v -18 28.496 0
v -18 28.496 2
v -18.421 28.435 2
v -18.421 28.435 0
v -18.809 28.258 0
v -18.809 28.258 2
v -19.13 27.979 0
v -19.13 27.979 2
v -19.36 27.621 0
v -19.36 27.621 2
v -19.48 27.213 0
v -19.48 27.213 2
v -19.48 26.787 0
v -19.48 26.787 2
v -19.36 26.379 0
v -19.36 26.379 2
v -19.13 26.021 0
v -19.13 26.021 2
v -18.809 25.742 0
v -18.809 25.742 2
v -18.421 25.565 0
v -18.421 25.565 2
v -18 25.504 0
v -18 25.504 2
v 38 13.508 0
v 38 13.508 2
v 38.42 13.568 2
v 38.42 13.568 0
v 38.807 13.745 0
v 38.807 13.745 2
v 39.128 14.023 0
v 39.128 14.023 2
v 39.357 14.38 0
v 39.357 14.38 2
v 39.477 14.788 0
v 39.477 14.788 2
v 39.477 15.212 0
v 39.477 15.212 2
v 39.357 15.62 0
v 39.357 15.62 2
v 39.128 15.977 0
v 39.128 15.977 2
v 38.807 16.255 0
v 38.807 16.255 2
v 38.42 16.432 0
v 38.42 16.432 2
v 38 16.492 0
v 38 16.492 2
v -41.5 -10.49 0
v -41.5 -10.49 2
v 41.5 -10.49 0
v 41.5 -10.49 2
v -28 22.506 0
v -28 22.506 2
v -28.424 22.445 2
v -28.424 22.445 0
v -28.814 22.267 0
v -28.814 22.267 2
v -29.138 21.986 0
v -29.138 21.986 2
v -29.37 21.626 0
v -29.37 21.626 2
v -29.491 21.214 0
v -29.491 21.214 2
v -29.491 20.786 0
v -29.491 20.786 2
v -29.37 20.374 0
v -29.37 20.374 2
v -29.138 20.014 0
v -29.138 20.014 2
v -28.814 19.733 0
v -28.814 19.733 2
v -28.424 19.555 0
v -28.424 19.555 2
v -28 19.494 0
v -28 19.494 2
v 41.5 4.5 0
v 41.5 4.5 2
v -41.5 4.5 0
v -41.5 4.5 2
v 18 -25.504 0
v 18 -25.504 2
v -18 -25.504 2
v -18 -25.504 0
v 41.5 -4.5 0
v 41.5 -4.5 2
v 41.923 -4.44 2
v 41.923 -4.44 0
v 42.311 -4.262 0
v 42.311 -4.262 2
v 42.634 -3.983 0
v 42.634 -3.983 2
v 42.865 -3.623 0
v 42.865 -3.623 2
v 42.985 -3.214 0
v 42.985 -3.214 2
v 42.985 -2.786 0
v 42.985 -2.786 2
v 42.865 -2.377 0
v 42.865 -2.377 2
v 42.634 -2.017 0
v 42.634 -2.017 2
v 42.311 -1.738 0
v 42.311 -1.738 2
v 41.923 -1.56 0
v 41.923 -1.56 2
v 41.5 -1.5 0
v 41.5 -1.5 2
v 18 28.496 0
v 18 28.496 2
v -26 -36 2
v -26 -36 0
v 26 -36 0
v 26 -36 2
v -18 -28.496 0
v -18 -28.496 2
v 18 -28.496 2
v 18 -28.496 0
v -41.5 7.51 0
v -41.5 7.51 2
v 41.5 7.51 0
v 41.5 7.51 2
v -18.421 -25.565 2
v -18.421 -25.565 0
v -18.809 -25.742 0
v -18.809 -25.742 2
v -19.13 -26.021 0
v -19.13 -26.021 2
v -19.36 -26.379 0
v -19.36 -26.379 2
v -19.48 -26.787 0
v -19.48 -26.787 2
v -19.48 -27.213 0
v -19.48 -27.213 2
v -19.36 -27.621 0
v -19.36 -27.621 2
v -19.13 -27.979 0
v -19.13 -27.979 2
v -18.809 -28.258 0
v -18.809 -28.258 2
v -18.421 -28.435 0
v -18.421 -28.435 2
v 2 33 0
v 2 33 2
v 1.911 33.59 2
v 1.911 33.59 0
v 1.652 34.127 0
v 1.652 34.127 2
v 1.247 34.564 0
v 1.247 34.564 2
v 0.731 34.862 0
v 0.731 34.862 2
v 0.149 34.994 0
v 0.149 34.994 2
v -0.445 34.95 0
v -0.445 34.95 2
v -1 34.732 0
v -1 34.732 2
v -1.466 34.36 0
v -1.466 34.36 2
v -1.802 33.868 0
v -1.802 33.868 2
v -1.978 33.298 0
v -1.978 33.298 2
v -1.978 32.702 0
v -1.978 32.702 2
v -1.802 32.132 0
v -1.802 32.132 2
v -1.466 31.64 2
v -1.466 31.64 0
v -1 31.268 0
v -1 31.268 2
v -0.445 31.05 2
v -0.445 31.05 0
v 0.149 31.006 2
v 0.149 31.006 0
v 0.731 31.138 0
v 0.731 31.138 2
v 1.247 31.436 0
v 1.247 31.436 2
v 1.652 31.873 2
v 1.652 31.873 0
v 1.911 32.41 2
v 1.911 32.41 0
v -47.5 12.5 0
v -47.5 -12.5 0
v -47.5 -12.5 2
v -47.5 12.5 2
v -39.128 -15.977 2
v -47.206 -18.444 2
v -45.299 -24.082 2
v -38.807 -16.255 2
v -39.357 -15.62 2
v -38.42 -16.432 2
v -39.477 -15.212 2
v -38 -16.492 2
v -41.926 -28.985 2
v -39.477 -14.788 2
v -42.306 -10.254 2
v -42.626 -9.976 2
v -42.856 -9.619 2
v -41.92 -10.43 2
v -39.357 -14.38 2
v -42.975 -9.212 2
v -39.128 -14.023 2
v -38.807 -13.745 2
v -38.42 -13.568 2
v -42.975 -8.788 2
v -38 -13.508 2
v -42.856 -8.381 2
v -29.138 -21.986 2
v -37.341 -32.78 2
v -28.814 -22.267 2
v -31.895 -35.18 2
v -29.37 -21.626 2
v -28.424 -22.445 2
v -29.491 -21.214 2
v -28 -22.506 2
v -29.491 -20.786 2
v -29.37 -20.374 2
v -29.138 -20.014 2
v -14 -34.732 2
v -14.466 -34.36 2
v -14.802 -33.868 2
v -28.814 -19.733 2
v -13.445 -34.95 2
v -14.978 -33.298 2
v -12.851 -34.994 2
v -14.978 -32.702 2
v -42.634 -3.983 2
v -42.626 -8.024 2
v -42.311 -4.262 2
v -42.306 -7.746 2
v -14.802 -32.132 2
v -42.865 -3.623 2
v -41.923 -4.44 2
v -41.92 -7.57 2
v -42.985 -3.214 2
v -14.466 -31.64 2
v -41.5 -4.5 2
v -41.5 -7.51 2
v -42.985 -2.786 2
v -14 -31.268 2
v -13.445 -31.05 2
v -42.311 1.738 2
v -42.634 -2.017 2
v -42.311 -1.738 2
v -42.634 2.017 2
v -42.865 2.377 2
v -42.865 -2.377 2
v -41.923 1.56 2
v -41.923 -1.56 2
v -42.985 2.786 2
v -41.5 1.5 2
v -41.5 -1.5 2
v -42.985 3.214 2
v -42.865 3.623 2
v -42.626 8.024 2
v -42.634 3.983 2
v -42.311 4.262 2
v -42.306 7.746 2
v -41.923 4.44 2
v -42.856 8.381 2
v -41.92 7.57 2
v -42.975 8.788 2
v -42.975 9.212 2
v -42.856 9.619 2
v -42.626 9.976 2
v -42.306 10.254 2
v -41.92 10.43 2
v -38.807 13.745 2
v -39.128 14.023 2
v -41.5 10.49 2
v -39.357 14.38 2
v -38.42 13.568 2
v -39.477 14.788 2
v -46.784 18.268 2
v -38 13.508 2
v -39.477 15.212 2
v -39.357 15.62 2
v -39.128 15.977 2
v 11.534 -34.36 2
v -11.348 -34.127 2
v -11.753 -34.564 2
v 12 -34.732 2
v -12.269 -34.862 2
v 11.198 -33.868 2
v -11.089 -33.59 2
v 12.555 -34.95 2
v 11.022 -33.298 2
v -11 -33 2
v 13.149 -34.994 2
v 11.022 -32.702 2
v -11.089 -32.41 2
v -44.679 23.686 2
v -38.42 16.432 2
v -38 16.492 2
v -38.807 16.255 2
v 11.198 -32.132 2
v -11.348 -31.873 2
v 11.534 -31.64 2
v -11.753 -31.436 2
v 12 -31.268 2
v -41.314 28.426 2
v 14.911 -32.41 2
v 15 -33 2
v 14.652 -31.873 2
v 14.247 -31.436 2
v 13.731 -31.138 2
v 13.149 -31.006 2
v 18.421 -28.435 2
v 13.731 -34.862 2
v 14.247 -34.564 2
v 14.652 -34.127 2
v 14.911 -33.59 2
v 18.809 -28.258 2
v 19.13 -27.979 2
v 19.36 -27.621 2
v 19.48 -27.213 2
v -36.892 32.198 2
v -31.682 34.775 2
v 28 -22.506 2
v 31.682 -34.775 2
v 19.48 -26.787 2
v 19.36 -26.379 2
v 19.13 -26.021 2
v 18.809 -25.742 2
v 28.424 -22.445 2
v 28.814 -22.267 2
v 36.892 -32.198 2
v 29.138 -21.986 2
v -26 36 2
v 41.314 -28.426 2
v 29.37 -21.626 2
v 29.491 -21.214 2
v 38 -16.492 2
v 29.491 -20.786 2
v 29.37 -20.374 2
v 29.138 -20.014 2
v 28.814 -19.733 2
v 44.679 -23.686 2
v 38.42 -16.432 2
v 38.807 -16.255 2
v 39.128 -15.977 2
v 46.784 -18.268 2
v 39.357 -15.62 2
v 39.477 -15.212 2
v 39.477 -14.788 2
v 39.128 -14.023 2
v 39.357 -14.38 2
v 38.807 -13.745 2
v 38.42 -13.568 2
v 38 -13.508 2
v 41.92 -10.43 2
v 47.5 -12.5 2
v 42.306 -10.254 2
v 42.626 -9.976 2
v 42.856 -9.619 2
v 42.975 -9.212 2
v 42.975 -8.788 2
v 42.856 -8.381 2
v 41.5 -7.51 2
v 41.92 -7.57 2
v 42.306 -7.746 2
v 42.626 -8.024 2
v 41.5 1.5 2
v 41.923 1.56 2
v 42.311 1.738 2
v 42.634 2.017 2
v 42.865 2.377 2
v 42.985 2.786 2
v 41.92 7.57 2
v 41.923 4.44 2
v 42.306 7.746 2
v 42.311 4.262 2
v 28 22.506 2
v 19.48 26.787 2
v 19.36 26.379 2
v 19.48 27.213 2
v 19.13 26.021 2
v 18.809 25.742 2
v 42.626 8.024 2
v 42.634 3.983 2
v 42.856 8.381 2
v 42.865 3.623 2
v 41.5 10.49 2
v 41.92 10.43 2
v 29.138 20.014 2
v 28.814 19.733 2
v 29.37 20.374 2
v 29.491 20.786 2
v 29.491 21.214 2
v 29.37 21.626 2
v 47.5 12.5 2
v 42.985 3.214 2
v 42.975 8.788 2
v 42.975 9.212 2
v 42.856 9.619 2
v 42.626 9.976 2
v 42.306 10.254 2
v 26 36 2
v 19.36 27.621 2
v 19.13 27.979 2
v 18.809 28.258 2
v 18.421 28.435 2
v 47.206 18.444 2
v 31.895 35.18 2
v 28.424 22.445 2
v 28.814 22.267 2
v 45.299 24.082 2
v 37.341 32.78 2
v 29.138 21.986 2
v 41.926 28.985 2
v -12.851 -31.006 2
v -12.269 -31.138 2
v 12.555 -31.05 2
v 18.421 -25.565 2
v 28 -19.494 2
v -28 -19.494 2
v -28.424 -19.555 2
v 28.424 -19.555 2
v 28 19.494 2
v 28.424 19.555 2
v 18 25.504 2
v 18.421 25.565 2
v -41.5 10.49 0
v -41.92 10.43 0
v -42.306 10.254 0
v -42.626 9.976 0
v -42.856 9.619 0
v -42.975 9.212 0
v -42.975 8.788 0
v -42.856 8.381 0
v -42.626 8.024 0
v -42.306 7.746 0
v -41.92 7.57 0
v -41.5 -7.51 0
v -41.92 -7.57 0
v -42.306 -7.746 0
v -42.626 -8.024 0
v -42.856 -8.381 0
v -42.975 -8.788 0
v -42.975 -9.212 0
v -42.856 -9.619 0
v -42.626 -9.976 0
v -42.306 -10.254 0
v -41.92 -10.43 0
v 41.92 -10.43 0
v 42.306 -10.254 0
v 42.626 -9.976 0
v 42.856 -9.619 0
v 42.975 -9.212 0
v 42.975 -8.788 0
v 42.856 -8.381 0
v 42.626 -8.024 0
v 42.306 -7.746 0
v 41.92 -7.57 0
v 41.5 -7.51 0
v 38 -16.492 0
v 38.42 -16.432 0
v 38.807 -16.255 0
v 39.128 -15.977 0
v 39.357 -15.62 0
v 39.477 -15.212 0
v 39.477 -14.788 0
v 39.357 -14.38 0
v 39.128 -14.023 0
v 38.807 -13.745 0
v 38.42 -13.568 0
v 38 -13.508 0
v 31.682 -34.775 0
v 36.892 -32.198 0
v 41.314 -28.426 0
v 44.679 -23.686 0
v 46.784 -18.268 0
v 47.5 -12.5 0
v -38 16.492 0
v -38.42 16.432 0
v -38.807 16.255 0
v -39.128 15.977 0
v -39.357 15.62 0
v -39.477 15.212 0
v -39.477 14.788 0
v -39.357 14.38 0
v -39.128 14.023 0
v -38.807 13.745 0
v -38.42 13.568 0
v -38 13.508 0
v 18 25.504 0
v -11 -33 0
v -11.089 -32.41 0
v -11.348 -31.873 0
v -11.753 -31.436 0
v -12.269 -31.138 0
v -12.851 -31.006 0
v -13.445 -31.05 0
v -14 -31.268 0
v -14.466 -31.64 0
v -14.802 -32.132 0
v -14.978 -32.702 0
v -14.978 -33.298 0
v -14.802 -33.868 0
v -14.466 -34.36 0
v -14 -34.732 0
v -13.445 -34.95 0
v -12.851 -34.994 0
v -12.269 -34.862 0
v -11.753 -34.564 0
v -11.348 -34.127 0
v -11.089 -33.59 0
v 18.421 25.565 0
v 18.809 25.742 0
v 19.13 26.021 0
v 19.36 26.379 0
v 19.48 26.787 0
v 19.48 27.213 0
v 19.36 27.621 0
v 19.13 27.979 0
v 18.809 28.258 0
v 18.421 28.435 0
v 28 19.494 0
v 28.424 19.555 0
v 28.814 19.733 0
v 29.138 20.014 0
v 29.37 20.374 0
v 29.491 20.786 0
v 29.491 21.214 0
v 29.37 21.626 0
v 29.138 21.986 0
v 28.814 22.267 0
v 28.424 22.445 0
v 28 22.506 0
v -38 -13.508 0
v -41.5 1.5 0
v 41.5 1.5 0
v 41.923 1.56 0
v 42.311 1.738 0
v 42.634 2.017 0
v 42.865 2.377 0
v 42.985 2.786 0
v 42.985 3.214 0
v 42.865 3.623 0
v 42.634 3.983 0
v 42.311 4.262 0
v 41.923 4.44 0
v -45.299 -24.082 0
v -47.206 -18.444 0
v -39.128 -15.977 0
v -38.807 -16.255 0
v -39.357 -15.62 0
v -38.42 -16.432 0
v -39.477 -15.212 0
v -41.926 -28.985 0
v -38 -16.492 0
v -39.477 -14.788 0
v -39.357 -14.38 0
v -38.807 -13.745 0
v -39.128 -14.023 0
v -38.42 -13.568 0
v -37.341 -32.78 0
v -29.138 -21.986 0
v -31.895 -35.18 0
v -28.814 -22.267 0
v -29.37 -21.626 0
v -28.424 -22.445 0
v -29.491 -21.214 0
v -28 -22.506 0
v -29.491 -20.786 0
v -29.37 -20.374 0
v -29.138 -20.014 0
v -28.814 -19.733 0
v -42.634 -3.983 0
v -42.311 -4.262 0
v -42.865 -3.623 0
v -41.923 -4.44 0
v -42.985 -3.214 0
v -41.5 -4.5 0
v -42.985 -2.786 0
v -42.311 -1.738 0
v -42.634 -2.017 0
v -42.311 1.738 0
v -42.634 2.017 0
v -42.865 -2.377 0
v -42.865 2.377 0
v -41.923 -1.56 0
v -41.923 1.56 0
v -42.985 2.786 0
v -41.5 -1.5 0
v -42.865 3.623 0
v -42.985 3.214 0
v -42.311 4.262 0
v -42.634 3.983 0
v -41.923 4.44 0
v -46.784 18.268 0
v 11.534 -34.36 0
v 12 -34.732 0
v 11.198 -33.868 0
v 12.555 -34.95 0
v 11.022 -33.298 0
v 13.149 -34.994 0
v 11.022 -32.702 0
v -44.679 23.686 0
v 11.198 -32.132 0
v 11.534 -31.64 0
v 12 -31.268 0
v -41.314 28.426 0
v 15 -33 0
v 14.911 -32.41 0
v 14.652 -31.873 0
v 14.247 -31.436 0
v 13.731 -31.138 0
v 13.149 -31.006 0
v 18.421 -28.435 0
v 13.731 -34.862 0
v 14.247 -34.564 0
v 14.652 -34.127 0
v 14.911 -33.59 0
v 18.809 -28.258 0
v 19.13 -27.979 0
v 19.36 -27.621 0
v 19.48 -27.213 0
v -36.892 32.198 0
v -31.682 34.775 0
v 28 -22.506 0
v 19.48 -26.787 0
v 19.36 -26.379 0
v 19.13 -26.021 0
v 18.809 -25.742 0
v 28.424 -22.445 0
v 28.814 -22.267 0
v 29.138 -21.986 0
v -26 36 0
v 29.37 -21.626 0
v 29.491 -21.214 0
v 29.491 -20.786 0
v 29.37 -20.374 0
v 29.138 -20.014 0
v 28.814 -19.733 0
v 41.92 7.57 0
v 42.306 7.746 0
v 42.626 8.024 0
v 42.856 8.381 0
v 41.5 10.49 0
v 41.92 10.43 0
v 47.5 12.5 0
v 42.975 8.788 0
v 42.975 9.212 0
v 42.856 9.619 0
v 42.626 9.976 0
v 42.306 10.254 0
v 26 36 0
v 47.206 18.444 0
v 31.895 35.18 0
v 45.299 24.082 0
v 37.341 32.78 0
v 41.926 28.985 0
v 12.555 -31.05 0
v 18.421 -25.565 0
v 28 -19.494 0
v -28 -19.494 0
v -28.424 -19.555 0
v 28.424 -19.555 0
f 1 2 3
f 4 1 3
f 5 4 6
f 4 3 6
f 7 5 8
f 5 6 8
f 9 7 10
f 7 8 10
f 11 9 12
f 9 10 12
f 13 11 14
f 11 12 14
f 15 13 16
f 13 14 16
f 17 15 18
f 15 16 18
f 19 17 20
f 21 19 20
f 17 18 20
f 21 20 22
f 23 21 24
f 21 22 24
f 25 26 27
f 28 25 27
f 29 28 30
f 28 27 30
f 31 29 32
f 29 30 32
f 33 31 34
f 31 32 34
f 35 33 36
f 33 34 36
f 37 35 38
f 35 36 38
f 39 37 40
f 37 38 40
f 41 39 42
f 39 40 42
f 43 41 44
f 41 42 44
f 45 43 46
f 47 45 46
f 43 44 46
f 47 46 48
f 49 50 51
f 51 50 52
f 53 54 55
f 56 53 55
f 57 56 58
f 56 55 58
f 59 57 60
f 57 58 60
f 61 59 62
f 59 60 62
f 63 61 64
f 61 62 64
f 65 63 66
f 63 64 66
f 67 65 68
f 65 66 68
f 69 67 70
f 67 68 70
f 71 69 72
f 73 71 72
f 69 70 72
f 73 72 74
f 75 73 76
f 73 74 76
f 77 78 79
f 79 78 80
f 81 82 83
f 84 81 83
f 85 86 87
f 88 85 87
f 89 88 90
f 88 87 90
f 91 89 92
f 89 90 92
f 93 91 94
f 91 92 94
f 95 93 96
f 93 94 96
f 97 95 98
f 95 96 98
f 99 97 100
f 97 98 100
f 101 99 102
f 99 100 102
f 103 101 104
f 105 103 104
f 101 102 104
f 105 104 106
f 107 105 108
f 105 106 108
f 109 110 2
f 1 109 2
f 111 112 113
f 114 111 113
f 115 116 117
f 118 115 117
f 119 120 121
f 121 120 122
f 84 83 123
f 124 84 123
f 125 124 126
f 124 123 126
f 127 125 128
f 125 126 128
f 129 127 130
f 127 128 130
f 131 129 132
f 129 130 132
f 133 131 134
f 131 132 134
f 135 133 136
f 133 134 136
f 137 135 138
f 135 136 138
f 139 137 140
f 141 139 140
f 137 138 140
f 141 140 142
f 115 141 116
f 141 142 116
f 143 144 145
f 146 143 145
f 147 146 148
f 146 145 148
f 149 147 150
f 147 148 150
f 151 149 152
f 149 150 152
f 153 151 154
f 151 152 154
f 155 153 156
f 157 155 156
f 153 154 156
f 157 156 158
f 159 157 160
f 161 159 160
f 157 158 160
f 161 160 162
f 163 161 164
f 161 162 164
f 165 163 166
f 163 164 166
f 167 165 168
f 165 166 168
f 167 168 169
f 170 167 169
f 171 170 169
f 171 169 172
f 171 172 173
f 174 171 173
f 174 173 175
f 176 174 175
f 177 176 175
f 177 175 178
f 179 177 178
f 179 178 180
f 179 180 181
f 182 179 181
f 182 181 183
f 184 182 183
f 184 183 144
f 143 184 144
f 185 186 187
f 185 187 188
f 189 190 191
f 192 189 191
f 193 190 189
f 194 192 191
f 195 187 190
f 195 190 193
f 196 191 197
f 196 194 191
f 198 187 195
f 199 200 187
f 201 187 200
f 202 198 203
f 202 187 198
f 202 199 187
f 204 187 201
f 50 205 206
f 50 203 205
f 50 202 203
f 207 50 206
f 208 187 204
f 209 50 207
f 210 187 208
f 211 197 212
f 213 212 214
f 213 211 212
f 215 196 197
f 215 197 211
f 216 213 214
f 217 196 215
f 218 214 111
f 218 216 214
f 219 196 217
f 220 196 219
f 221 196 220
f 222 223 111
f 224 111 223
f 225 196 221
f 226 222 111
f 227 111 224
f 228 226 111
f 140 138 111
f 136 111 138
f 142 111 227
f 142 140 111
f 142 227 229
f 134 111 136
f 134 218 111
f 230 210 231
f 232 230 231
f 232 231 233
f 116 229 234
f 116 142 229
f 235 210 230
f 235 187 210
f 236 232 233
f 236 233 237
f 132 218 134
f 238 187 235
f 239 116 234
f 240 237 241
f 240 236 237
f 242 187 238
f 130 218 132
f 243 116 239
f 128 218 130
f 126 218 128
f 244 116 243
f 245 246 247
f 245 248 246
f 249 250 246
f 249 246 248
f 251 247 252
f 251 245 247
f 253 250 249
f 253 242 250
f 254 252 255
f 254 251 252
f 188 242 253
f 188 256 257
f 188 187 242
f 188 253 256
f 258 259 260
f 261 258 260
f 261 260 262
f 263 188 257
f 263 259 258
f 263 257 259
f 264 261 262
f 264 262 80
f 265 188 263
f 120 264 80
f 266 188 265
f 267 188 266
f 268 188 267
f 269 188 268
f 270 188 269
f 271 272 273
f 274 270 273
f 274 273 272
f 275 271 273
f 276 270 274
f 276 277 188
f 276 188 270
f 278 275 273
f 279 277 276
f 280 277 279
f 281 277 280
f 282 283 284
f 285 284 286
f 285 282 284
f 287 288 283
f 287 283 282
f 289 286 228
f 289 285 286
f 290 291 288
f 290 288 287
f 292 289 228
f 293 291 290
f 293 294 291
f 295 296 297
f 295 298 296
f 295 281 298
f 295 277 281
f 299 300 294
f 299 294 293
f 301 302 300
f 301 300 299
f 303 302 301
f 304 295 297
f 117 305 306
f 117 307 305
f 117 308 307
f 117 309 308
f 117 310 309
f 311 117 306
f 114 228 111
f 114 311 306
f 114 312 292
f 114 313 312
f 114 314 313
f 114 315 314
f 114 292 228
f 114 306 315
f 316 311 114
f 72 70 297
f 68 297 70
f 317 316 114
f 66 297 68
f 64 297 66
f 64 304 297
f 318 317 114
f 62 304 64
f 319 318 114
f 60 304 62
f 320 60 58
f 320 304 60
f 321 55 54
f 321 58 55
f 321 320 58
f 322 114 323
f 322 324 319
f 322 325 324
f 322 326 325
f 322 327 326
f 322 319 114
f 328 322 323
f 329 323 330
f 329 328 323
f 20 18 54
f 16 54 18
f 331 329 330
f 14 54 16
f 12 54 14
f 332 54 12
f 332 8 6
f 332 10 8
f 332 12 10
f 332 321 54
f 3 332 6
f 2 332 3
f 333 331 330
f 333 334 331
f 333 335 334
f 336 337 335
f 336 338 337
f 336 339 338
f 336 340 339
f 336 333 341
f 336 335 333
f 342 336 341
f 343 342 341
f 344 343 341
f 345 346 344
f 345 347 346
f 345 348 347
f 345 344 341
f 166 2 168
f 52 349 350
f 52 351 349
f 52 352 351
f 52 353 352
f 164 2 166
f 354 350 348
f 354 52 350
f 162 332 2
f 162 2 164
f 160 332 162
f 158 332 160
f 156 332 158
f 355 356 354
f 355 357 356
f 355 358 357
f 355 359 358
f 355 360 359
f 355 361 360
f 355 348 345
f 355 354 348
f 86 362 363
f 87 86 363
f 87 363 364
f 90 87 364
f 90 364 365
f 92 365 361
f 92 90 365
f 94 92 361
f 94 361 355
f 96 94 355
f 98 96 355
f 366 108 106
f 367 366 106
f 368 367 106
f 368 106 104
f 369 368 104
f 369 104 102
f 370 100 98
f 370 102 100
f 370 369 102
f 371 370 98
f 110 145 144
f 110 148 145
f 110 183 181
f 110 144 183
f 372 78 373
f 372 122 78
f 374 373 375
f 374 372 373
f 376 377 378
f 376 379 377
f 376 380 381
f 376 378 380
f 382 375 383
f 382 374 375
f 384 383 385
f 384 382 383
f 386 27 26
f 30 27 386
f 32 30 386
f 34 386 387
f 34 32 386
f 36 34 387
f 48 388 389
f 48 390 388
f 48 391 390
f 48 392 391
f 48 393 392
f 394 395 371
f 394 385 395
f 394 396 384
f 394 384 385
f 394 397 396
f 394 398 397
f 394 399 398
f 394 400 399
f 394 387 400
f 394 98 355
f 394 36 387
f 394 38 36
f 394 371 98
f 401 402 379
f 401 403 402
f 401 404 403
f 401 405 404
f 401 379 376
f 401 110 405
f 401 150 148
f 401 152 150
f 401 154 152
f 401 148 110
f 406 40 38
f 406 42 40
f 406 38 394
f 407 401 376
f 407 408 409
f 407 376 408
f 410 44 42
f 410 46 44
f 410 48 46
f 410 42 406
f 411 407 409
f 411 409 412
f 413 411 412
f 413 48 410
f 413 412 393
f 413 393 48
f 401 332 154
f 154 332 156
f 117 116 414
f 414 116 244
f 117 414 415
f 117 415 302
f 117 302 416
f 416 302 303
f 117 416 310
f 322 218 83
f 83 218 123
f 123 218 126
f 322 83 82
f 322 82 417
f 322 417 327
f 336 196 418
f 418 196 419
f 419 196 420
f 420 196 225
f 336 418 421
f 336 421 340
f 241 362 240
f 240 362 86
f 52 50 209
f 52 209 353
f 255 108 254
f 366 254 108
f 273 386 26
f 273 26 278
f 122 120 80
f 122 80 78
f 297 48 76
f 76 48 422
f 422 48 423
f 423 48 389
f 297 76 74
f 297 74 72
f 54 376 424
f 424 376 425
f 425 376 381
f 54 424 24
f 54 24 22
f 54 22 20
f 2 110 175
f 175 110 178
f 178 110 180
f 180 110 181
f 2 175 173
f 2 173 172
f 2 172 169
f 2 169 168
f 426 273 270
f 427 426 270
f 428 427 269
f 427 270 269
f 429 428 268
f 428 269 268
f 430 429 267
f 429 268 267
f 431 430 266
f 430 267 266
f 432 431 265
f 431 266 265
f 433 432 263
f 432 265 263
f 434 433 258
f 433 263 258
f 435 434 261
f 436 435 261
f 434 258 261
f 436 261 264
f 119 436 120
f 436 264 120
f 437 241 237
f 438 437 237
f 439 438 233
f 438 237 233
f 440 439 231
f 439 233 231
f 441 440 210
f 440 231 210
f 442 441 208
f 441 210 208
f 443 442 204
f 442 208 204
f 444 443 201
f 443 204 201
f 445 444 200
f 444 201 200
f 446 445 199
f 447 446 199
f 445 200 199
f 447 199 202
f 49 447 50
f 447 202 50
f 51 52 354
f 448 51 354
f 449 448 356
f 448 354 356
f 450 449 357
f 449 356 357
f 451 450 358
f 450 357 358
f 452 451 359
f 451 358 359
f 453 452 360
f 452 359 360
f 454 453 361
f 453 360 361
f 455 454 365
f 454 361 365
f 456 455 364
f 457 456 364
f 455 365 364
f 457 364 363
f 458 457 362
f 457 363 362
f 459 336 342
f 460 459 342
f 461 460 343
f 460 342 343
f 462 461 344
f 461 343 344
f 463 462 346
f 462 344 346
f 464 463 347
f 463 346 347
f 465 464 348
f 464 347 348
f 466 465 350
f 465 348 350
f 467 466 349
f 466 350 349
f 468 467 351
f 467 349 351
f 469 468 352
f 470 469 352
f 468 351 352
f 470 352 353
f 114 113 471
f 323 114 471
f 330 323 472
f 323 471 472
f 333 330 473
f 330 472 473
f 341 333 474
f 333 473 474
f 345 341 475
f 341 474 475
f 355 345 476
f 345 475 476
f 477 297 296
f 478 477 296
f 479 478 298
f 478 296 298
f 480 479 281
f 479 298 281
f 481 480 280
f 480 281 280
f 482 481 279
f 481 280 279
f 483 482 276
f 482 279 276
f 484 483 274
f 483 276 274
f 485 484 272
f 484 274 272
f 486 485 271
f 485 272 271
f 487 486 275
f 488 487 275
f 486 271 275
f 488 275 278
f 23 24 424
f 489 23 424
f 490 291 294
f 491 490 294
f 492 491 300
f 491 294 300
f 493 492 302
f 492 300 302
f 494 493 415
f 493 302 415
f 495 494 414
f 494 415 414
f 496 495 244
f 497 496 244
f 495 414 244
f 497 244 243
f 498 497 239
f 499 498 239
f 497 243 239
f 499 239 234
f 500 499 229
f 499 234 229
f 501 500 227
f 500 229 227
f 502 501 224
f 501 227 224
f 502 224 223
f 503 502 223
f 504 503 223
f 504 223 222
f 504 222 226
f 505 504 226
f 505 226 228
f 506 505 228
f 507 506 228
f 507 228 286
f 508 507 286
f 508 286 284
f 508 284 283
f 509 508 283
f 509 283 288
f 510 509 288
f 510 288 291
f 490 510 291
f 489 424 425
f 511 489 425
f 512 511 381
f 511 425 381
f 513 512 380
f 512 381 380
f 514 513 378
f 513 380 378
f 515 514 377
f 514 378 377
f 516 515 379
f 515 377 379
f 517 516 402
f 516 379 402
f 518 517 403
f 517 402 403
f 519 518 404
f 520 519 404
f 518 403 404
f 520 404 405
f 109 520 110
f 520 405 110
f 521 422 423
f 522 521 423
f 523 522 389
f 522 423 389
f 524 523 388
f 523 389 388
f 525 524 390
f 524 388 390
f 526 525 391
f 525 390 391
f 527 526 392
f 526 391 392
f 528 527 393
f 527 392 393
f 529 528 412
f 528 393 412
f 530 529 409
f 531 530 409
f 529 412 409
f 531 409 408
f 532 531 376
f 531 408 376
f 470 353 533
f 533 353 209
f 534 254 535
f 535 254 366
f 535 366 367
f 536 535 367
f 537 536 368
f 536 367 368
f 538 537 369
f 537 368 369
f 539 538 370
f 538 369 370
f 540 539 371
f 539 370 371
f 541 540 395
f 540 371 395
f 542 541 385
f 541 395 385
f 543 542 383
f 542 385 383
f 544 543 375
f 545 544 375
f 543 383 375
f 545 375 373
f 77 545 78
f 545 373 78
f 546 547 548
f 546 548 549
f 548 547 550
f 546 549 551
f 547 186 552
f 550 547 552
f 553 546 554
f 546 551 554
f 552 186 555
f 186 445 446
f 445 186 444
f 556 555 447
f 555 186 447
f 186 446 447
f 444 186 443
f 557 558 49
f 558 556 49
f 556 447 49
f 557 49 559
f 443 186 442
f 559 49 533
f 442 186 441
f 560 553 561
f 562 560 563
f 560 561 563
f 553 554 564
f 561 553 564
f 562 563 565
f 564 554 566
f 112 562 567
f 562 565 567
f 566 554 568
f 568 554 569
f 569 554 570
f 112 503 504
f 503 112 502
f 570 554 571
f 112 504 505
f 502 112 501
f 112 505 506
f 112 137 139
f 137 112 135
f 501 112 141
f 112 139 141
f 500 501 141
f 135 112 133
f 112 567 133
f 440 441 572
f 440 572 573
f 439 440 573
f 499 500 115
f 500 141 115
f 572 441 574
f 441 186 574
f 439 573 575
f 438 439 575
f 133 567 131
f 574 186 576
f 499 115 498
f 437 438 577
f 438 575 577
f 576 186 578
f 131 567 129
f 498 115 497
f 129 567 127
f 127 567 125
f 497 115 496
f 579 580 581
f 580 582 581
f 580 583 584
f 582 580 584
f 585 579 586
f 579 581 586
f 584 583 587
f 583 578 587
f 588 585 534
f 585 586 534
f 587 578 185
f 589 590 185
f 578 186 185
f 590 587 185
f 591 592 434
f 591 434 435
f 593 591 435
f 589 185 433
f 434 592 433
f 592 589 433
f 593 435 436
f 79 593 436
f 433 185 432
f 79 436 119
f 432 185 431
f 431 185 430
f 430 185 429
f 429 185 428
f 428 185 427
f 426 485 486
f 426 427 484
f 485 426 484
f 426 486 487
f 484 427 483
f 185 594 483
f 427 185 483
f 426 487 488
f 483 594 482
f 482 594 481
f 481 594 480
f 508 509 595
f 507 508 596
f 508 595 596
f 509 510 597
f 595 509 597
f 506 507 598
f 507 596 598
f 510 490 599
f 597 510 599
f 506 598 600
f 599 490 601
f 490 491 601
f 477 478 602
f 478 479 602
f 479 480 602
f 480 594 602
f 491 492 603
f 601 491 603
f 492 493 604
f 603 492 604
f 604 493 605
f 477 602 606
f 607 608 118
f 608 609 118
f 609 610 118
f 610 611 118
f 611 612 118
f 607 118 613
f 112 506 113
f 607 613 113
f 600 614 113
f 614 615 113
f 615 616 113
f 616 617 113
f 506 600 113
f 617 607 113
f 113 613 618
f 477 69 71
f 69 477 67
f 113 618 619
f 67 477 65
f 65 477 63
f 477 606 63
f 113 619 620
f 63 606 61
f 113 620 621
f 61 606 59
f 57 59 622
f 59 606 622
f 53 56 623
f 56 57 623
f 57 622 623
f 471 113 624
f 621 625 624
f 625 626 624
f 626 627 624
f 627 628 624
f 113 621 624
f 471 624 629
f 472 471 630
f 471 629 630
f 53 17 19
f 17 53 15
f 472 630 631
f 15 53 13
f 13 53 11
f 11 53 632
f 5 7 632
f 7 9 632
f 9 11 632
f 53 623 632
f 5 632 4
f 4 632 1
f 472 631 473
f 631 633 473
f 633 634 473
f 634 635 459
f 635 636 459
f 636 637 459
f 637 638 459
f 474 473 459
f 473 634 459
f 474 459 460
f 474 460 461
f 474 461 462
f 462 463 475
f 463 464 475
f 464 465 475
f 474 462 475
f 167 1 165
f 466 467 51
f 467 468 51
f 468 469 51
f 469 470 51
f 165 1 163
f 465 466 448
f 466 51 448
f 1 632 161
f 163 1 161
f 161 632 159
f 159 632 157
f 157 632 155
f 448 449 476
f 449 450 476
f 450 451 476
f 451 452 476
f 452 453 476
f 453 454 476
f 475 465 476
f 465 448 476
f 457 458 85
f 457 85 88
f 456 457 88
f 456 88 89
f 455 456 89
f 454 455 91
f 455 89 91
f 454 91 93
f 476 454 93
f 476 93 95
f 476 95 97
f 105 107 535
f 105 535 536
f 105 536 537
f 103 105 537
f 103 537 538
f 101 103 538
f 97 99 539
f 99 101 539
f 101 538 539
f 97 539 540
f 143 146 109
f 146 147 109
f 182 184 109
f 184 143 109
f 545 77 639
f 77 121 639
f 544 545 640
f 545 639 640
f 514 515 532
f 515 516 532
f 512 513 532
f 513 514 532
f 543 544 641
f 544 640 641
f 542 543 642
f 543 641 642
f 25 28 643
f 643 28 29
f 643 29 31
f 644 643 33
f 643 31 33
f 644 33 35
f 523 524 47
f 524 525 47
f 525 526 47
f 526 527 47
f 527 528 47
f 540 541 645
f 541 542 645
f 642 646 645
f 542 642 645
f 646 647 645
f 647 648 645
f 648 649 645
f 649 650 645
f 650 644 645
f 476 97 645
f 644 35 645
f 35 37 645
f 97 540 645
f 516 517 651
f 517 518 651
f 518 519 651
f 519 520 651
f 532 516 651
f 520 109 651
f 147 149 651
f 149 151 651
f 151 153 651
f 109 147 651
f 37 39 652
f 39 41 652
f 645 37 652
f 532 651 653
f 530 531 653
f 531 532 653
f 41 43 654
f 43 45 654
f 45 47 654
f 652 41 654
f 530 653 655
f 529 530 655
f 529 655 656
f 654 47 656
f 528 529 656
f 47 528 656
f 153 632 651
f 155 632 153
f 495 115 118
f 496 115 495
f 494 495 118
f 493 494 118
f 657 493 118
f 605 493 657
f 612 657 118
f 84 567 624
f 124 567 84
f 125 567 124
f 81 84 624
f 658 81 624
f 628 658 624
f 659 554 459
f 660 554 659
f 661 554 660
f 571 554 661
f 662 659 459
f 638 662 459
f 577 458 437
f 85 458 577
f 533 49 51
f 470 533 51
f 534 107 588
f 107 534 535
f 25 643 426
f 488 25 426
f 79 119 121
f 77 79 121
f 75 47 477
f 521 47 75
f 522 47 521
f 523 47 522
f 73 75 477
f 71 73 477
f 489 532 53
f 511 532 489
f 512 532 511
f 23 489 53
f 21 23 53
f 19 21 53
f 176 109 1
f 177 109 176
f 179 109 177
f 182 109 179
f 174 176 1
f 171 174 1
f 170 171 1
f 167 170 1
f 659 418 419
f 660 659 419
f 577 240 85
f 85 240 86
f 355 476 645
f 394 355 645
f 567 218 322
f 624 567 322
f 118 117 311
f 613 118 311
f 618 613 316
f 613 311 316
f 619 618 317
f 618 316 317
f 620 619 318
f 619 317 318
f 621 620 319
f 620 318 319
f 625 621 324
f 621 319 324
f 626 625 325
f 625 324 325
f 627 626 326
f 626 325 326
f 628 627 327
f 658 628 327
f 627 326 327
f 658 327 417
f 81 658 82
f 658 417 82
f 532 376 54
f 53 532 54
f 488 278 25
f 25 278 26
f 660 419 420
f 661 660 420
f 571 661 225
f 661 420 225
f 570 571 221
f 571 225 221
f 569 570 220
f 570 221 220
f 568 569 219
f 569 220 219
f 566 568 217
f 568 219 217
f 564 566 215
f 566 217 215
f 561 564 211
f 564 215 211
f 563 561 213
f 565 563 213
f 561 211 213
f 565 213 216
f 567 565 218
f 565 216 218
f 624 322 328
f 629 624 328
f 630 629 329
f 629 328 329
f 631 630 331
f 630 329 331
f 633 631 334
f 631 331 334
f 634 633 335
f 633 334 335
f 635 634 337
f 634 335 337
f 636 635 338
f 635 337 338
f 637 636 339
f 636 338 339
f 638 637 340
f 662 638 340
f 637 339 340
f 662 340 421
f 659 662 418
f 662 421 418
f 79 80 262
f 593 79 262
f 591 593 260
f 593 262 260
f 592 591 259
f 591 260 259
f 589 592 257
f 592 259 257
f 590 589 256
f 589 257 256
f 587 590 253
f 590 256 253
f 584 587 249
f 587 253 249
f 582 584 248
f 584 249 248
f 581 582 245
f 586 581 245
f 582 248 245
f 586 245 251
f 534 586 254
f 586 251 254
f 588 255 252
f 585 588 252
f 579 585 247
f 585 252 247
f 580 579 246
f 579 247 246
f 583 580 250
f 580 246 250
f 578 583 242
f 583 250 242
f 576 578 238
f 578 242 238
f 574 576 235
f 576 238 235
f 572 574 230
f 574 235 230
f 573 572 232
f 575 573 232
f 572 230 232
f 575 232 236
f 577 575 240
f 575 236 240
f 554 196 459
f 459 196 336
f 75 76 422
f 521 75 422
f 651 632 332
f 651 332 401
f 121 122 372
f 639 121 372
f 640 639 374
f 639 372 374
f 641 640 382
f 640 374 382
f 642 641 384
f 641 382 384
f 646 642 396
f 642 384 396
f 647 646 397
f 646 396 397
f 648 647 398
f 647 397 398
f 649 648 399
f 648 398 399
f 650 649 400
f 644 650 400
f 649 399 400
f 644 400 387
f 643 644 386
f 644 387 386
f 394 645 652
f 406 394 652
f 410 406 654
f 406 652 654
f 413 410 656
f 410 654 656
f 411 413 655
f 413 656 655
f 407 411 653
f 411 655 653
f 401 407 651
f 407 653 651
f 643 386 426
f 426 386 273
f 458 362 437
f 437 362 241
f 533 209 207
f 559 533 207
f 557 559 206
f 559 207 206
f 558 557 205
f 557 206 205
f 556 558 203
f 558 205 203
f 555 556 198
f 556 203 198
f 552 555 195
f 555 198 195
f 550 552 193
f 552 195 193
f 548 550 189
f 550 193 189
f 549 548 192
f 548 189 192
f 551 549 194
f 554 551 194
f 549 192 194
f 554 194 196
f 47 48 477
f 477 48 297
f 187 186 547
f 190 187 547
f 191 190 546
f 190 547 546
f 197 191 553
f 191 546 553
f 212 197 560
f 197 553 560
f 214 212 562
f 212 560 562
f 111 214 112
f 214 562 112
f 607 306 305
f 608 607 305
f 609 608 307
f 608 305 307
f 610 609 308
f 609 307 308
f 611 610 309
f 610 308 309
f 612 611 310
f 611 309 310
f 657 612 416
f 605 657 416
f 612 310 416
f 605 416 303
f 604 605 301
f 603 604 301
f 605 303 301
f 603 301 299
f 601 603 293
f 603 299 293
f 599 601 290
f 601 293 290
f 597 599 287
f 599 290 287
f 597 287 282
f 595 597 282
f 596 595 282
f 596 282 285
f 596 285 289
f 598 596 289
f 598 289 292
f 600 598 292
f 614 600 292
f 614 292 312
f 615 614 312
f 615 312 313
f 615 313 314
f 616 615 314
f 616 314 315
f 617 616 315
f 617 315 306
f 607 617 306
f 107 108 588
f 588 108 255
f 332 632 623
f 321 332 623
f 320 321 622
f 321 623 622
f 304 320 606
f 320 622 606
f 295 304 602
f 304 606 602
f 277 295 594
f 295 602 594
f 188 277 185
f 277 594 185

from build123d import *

# Parameters (mm, degrees)
SKETCH1_W           = 52
SKETCH1_H           = 23.5
SKETCH1_W_2         = 21.5
SKETCH1_H_2         = 25
BOSS_EXTRUDE1_DEPTH = 2
CUT_EXTRUDE1_DEPTH  = 2
SKETCH3_R           = 2
CUT_EXTRUDE2_DEPTH  = 10


with BuildPart() as part:
    # Sketch1 → Boss-Extrude1 (new body)
    with BuildSketch(Plane.XY):
        with Locations((0, 24.25)):
            Rectangle(SKETCH1_W, SKETCH1_H)
        with BuildLine():
            Line((26, 36), (26, 12.5))
            Line((26, 12.5), (47.5, 12.5))
            ThreePointArc((47.5, 12.5), (41.925608309, 28.985131006), (26, 36))
        make_face()
        with Locations((36.75, 0)):
            Rectangle(SKETCH1_W_2, SKETCH1_H_2)
        Rectangle(SKETCH1_W, SKETCH1_H_2)
        with BuildLine():
            Line((47.5, -12.5), (26, -12.5))
            Line((26, -12.5), (26, -36))
            ThreePointArc((26, -36), (41.314036989, -28.425608309), (47.5, -12.5))
        make_face()
        with Locations((0, -24.25)):
            Rectangle(SKETCH1_W, SKETCH1_H)
        with BuildLine():
            Line((-26, -12.5), (-47.5, -12.5))
            ThreePointArc((-47.5, -12.5), (-41.925608309, -28.985131006), (-26, -36))
            Line((-26, -36), (-26, -12.5))
        make_face()
        with Locations((-36.75, 0)):
            Rectangle(SKETCH1_W_2, SKETCH1_H_2)
        with BuildLine():
            ThreePointArc((-26, 36), (-41.314036989, 28.425608309), (-47.5, 12.5))
            Line((-47.5, 12.5), (-26, 12.5))
            Line((-26, 12.5), (-26, 36))
        make_face()
    extrude(amount=BOSS_EXTRUDE1_DEPTH)

    # Sketch2 → Cut-Extrude1 (cut)
    with BuildSketch(Plane.XY.offset(2)):
        with BuildLine():
            Line((0, -1.499605822), (-41.5, -1.499605822))
            ThreePointArc((-41.5, -1.499605822), (-43.000394178, -3), (-41.5, -4.500394178))
            Line((-41.5, -4.500394178), (41.5, -4.500394178))
            ThreePointArc((41.5, -4.500394178), (43.000394178, -3), (41.5, -1.499605822))
            Line((41.5, -1.499605822), (0, -1.499605822))
        make_face()
        with BuildLine():
            ThreePointArc((-18, 28.495571567), (-19.495571567, 27), (-18, 25.504428433))
            Line((-18, 25.504428433), (18, 25.504428433))
            ThreePointArc((18, 25.504428433), (19.495571567, 27), (18, 28.495571567))
            Line((18, 28.495571567), (-18, 28.495571567))
        make_face()
        with BuildLine():
            Line((41.5, -7.509541658), (-41.5, -7.509541658))
            ThreePointArc((-41.5, -7.509541658), (-42.990458342, -9), (-41.5, -10.490458342))
            Line((-41.5, -10.490458342), (41.5, -10.490458342))
            ThreePointArc((41.5, -10.490458342), (42.990458342, -9), (41.5, -7.509541658))
        make_face()
        with BuildLine():
            Line((38, -13.507793121), (-38, -13.507793121))
            ThreePointArc((-38, -13.507793121), (-39.492206879, -15), (-38, -16.492206879))
            Line((-38, -16.492206879), (38, -16.492206879))
            ThreePointArc((38, -16.492206879), (39.492206879, -15), (38, -13.507793121))
        make_face()
        with BuildLine():
            Line((28, -19.493656832), (-28, -19.493656832))
            ThreePointArc((-28, -19.493656832), (-29.506343168, -21), (-28, -22.506343168))
            Line((-28, -22.506343168), (0, -22.506343168))
            Line((0, -22.506343168), (28, -22.506343168))
            ThreePointArc((28, -22.506343168), (29.506343168, -21), (28, -19.493656832))
        make_face()
        with BuildLine():
            Line((18, -25.504428433), (-18, -25.504428433))
            ThreePointArc((-18, -25.504428433), (-19.495571567, -27), (-18, -28.495571567))
            Line((-18, -28.495571567), (18, -28.495571567))
            ThreePointArc((18, -28.495571567), (19.495571567, -27), (18, -25.504428433))
        make_face()
        with BuildLine():
            ThreePointArc((-28, 22.506343168), (-29.506343168, 21), (-28, 19.493656832))
            Line((-28, 19.493656832), (28, 19.493656832))
            ThreePointArc((28, 19.493656832), (29.506343168, 21), (28, 22.506343168))
            Line((28, 22.506343168), (0, 22.506343168))
            Line((0, 22.506343168), (-28, 22.506343168))
        make_face()
        with BuildLine():
            ThreePointArc((-38, 16.492206879), (-39.492206879, 15), (-38, 13.507793121))
            Line((-38, 13.507793121), (38, 13.507793121))
            ThreePointArc((38, 13.507793121), (39.492206879, 15), (38, 16.492206879))
            Line((38, 16.492206879), (-38, 16.492206879))
        make_face()
        with BuildLine():
            ThreePointArc((-41.5, 10.490458342), (-42.990458342, 9), (-41.5, 7.509541658))
            Line((-41.5, 7.509541658), (41.5, 7.509541658))
            ThreePointArc((41.5, 7.509541658), (42.990458342, 9), (41.5, 10.490458342))
            Line((41.5, 10.490458342), (-41.5, 10.490458342))
        make_face()
        with BuildLine():
            ThreePointArc((-41.5, 4.500394178), (-43.000394178, 3), (-41.5, 1.499605822))
            Line((-41.5, 1.499605822), (41.5, 1.499605822))
            ThreePointArc((41.5, 1.499605822), (43.000394178, 3), (41.5, 4.500394178))
            Line((41.5, 4.500394178), (-41.5, 4.500394178))
        make_face()
    extrude(amount=-CUT_EXTRUDE1_DEPTH, mode=Mode.SUBTRACT)

    # Sketch3 → Cut-Extrude2 (cut)
    with BuildSketch(Plane.XY.offset(2)):
        with Locations((0, 33)):
            Circle(SKETCH3_R)
        with Locations((-13, -33)):
            Circle(SKETCH3_R)
        with Locations((13, -33)):
            Circle(SKETCH3_R)
    extrude(amount=-CUT_EXTRUDE2_DEPTH, mode=Mode.SUBTRACT)


solid = part.part
